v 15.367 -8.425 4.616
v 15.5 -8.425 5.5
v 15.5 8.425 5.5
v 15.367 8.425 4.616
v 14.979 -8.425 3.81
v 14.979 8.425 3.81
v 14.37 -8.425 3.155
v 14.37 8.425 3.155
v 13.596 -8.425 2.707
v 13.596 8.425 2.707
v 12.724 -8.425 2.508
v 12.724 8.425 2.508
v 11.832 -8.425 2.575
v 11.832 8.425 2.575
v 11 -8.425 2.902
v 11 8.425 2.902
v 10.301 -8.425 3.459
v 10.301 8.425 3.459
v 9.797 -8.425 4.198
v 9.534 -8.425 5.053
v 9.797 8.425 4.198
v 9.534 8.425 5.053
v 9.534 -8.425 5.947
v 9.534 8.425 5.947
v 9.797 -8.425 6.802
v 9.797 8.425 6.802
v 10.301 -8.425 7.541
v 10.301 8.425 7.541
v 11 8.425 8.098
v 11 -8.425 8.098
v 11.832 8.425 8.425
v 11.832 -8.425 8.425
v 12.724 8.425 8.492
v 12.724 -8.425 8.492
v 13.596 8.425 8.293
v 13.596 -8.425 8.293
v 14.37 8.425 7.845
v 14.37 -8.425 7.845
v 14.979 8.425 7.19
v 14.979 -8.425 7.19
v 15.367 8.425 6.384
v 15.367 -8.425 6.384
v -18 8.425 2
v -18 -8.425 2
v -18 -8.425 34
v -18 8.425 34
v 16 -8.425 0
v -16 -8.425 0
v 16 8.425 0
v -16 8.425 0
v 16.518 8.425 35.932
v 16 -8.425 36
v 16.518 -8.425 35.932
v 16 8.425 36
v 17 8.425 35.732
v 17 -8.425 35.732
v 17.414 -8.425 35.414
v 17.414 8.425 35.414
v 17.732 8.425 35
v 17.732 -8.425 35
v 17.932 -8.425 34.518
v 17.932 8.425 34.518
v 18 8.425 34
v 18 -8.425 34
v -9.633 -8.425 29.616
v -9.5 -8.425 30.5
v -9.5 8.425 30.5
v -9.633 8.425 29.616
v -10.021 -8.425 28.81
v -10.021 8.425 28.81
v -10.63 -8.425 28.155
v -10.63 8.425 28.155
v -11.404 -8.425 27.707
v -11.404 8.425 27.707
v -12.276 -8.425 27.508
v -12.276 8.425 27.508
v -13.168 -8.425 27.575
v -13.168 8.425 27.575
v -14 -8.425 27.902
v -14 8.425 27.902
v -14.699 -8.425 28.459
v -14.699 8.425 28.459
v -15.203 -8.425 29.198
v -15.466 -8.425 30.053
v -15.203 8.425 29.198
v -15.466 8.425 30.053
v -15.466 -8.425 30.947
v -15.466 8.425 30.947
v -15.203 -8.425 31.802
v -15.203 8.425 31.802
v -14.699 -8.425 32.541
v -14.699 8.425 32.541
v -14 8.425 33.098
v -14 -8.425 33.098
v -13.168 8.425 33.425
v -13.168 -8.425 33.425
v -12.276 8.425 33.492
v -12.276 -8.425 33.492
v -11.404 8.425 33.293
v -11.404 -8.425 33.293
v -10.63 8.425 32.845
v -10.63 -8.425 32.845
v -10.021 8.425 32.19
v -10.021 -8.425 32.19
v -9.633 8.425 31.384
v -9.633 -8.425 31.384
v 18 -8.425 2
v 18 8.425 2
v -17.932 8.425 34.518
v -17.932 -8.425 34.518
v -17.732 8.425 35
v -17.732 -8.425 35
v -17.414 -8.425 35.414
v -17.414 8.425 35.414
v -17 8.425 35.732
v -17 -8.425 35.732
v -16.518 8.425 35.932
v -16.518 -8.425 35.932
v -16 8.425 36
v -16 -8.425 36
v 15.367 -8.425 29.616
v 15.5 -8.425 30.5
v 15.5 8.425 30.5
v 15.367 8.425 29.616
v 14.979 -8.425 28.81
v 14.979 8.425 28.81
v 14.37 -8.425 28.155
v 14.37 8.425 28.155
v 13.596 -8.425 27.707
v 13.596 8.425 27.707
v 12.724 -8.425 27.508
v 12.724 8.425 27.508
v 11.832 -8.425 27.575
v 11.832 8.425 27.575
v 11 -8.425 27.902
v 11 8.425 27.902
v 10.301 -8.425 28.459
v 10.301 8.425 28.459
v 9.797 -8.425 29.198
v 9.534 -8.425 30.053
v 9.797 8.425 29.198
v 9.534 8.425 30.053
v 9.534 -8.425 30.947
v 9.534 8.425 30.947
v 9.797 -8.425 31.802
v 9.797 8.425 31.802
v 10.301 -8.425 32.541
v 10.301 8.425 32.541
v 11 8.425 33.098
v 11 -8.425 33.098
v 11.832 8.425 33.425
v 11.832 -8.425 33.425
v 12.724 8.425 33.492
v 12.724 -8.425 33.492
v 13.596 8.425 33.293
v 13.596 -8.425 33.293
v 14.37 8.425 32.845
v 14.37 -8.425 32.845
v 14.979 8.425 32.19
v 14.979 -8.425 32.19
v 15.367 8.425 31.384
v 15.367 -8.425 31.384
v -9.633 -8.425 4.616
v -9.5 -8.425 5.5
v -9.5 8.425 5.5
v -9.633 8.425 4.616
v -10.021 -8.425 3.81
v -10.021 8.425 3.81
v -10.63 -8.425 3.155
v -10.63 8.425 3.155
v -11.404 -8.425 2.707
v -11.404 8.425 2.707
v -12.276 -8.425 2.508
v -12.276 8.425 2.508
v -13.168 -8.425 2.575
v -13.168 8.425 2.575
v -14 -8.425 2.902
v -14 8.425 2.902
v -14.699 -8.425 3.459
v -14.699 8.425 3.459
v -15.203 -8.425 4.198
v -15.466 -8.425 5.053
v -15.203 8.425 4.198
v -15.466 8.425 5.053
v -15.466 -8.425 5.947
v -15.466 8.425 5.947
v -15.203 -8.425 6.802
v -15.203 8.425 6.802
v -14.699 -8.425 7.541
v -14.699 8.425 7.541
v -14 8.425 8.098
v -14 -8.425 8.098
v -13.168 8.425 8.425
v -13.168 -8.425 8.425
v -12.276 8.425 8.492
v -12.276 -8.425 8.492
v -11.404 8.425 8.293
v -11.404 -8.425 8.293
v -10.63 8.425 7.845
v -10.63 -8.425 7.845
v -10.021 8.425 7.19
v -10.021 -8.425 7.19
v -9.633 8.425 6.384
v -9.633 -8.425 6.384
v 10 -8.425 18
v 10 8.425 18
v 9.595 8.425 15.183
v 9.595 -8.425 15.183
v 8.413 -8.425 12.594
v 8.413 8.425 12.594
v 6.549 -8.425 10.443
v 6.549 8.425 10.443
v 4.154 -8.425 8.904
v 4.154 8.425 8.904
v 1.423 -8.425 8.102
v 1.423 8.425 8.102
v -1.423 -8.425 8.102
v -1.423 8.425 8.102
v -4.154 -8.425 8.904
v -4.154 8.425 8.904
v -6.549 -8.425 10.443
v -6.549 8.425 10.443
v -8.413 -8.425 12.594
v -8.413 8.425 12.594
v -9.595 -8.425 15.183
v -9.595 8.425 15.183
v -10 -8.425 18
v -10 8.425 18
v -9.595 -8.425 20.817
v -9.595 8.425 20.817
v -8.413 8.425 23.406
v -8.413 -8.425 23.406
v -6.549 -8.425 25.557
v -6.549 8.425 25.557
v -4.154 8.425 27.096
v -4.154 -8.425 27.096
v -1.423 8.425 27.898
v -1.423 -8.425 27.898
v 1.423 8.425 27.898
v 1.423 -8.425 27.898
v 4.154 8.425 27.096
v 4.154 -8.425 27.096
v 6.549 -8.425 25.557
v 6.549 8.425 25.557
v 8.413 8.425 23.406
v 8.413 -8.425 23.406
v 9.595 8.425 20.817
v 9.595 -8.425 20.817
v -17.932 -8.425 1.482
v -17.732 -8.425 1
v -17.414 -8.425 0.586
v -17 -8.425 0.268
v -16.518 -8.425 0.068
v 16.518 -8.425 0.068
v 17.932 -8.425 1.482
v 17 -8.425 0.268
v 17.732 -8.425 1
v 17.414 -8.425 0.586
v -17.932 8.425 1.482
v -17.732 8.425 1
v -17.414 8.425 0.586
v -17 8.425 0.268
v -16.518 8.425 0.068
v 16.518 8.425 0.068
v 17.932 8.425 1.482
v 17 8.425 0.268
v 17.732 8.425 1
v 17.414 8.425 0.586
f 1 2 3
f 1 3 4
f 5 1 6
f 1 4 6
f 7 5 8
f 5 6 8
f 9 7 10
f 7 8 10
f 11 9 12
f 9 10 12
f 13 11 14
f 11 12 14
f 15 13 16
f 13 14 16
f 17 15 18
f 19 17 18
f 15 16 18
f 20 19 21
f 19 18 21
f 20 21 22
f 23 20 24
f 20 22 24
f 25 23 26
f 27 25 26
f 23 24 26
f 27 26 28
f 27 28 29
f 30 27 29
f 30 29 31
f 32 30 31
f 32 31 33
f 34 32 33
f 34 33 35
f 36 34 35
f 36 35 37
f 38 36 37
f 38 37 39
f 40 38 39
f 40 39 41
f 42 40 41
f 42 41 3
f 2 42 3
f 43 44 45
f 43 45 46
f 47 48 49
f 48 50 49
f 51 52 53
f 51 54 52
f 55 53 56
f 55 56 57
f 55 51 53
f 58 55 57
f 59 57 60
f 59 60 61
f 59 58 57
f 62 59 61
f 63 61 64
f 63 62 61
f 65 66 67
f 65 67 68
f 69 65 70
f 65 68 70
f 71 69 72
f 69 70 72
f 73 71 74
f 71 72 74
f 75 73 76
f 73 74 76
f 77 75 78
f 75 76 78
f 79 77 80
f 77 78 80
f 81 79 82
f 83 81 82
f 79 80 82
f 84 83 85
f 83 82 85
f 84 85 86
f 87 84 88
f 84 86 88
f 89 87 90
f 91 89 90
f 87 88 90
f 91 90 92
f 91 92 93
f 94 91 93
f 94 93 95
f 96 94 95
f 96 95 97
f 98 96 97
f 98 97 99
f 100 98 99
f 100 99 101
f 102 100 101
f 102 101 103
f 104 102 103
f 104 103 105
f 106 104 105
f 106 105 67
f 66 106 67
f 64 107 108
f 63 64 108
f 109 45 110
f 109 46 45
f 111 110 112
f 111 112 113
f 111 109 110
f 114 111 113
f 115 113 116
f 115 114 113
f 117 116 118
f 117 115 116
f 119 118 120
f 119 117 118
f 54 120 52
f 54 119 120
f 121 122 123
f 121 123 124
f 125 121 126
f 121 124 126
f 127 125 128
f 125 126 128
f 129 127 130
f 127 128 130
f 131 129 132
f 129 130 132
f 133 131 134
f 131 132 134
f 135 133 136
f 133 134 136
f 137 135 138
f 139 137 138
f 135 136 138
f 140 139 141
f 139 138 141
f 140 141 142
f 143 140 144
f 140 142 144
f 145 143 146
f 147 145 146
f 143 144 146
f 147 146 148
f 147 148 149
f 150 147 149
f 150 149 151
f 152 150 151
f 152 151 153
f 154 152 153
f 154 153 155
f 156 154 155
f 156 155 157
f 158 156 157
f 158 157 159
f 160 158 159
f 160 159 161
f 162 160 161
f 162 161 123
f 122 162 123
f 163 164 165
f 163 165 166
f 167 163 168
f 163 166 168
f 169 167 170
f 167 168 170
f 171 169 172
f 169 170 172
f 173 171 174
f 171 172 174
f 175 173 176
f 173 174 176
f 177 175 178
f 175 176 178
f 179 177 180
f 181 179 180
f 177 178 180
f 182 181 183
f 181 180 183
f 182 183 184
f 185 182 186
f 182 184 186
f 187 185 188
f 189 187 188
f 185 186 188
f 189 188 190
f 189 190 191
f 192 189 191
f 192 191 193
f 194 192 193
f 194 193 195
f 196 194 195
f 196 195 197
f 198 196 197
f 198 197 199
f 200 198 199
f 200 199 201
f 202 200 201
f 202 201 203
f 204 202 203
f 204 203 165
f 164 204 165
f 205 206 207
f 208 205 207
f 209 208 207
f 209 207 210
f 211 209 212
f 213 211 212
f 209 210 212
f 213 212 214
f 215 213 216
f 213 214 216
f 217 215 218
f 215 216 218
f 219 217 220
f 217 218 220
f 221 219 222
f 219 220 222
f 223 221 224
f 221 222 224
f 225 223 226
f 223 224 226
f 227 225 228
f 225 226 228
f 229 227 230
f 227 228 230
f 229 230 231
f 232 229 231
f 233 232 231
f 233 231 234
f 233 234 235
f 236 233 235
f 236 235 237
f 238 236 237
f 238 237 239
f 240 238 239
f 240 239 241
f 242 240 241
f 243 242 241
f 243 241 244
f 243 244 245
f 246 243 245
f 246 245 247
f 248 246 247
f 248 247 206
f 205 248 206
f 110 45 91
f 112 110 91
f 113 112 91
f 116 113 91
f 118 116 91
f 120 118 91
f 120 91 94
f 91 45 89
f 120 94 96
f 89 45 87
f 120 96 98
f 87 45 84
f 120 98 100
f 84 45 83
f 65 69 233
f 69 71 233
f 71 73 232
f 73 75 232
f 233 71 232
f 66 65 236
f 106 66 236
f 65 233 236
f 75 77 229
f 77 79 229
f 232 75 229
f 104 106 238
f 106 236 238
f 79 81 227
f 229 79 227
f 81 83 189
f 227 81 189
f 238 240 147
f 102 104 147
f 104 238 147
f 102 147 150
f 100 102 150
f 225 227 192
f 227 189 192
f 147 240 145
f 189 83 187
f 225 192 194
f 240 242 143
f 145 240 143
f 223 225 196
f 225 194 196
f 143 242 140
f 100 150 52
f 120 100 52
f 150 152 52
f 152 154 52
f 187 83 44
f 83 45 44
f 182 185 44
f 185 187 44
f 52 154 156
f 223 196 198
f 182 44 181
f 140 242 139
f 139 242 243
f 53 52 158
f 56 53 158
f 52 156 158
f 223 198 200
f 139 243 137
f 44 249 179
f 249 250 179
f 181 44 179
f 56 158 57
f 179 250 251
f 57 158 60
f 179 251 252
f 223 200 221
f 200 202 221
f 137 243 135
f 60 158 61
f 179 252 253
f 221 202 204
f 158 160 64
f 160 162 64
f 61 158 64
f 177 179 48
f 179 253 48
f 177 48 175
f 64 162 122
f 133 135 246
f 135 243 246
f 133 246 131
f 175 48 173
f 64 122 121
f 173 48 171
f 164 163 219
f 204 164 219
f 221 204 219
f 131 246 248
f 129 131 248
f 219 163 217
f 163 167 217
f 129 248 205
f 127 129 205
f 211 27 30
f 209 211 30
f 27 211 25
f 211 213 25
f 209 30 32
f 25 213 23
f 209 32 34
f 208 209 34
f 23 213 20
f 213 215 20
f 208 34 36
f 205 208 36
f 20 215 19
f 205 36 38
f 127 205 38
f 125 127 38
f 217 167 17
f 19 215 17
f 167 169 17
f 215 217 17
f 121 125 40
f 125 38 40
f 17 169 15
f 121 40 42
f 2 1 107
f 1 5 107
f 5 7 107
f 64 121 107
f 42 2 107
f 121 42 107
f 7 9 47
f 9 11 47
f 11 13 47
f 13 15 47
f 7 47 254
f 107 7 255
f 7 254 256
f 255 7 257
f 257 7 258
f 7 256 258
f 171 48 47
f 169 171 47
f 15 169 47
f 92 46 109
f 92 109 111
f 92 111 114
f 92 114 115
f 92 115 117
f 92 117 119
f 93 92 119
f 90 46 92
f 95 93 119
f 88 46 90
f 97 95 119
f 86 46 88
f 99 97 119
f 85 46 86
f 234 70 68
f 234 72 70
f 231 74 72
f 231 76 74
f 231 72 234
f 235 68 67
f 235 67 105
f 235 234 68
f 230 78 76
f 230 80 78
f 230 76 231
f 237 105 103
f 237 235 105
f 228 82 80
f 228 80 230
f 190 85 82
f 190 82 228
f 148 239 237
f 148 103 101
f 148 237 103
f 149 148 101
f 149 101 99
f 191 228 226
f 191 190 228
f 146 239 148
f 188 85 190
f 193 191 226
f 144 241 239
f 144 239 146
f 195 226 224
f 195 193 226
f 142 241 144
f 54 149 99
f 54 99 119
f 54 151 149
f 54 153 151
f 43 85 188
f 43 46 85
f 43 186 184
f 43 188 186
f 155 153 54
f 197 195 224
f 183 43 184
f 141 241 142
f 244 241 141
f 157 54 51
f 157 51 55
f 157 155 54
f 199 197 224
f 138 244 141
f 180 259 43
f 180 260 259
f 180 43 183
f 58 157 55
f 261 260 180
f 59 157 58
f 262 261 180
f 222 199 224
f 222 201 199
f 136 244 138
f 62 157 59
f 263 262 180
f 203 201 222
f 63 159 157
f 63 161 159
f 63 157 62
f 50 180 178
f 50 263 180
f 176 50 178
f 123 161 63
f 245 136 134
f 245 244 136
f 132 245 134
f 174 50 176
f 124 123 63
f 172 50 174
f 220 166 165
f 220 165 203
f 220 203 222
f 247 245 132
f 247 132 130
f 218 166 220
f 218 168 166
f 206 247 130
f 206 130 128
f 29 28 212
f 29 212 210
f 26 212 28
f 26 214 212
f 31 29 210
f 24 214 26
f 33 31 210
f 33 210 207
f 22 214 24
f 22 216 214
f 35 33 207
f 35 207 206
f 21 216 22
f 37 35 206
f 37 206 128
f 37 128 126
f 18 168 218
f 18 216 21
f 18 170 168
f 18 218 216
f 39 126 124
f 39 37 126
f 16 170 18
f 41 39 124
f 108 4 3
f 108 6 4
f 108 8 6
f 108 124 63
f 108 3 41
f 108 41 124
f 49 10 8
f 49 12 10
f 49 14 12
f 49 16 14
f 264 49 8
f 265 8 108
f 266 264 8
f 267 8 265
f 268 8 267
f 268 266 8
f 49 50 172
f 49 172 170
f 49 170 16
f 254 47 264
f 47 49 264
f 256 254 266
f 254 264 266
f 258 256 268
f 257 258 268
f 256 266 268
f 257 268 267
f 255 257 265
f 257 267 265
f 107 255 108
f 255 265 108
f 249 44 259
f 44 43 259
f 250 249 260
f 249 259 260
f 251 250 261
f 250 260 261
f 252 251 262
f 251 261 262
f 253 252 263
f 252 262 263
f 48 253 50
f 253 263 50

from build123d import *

# Parameters (mm, degrees)
SKETCH_1_W          = 36
SKETCH_1_H          = 16.85
EXTRUDE_1_DEPTH     = 36
SKETCH_2_R          = 3
CUT_EXTRUDE_1_DEPTH = 17.85
SKETCH_3_R          = 10
CUT_EXTRUDE_2_DEPTH = 17.85
FILLET_1_R          = 2


with BuildPart() as part:
    # 草图1 → 凸台-拉伸1 (new body)
    with BuildSketch(Plane.XY):
        Rectangle(SKETCH_1_W, SKETCH_1_H)
    extrude(amount=EXTRUDE_1_DEPTH)

    # 草图2 → 切除-拉伸1 (cut, through all)
    with BuildSketch(Plane(origin=(0, 8.425, 0), x_dir=(1, 0, 0), z_dir=(0, 1, 0))):
        with Locations((-12.5, -5.5)):
            Circle(SKETCH_2_R)
        with Locations((-12.5, -30.5)):
            Circle(SKETCH_2_R)
        with Locations((12.5, -30.5)):
            Circle(SKETCH_2_R)
        with Locations((12.5, -5.5)):
            Circle(SKETCH_2_R)
    extrude(amount=-CUT_EXTRUDE_1_DEPTH, mode=Mode.SUBTRACT)

    # 草图3 → 切除-拉伸2 (cut, through all)
    with BuildSketch(Plane(origin=(0, 8.425, 0), x_dir=(1, 0, 0), z_dir=(0, 1, 0))):
        with Locations((0, -18)):
            Circle(SKETCH_3_R)
    extrude(amount=-CUT_EXTRUDE_2_DEPTH, mode=Mode.SUBTRACT)

    # 圆角1
    fillet_1_edges = [part.edges().sort_by_distance(p)[0] for p in [
        (-18, 0, 36),
        (18, 0, 36),
        (-18, 0, 0),
        (18, 0, 0),
    ]]
    fillet(fillet_1_edges, radius=FILLET_1_R)


solid = part.part
